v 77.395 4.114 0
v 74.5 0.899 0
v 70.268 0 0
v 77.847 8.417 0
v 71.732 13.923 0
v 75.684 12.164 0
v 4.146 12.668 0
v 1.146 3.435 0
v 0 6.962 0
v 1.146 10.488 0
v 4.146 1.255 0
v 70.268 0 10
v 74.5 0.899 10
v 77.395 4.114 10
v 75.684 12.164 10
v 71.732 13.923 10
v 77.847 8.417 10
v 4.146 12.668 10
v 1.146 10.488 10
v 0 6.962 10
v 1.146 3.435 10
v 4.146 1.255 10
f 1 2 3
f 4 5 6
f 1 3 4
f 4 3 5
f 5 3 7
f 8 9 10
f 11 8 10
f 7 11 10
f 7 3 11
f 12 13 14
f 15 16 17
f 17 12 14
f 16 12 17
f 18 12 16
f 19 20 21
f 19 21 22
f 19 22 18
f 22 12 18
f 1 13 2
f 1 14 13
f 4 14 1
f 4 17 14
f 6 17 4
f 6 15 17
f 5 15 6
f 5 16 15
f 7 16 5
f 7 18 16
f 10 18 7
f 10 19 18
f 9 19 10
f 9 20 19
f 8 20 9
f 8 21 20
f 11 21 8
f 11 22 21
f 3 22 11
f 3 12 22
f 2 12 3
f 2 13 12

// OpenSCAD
$fn = 32;

// ----------------------------------------------------------------------
// Lever arm: two bosses 12 and 14 mm, 65 mm between centres
// ----------------------------------------------------------------------

// --- parameters (mm) ---
profile_height = 10;      // extrusion height
profile_points = 11;      // points of the closed outline

profile = [[0, 6.962], [1.146, 3.435], [4.146, 1.255], [70.268, 0], [74.5, 0.899], [77.395, 4.114], [77.847, 8.417], [75.684, 12.164], [71.732, 13.923], [4.146, 12.668], [1.146, 10.488]];  // single closed polygon, 11 points, counter clockwise

// --- the one profile operation ---
linear_extrude(height = profile_height) polygon(points = profile);
